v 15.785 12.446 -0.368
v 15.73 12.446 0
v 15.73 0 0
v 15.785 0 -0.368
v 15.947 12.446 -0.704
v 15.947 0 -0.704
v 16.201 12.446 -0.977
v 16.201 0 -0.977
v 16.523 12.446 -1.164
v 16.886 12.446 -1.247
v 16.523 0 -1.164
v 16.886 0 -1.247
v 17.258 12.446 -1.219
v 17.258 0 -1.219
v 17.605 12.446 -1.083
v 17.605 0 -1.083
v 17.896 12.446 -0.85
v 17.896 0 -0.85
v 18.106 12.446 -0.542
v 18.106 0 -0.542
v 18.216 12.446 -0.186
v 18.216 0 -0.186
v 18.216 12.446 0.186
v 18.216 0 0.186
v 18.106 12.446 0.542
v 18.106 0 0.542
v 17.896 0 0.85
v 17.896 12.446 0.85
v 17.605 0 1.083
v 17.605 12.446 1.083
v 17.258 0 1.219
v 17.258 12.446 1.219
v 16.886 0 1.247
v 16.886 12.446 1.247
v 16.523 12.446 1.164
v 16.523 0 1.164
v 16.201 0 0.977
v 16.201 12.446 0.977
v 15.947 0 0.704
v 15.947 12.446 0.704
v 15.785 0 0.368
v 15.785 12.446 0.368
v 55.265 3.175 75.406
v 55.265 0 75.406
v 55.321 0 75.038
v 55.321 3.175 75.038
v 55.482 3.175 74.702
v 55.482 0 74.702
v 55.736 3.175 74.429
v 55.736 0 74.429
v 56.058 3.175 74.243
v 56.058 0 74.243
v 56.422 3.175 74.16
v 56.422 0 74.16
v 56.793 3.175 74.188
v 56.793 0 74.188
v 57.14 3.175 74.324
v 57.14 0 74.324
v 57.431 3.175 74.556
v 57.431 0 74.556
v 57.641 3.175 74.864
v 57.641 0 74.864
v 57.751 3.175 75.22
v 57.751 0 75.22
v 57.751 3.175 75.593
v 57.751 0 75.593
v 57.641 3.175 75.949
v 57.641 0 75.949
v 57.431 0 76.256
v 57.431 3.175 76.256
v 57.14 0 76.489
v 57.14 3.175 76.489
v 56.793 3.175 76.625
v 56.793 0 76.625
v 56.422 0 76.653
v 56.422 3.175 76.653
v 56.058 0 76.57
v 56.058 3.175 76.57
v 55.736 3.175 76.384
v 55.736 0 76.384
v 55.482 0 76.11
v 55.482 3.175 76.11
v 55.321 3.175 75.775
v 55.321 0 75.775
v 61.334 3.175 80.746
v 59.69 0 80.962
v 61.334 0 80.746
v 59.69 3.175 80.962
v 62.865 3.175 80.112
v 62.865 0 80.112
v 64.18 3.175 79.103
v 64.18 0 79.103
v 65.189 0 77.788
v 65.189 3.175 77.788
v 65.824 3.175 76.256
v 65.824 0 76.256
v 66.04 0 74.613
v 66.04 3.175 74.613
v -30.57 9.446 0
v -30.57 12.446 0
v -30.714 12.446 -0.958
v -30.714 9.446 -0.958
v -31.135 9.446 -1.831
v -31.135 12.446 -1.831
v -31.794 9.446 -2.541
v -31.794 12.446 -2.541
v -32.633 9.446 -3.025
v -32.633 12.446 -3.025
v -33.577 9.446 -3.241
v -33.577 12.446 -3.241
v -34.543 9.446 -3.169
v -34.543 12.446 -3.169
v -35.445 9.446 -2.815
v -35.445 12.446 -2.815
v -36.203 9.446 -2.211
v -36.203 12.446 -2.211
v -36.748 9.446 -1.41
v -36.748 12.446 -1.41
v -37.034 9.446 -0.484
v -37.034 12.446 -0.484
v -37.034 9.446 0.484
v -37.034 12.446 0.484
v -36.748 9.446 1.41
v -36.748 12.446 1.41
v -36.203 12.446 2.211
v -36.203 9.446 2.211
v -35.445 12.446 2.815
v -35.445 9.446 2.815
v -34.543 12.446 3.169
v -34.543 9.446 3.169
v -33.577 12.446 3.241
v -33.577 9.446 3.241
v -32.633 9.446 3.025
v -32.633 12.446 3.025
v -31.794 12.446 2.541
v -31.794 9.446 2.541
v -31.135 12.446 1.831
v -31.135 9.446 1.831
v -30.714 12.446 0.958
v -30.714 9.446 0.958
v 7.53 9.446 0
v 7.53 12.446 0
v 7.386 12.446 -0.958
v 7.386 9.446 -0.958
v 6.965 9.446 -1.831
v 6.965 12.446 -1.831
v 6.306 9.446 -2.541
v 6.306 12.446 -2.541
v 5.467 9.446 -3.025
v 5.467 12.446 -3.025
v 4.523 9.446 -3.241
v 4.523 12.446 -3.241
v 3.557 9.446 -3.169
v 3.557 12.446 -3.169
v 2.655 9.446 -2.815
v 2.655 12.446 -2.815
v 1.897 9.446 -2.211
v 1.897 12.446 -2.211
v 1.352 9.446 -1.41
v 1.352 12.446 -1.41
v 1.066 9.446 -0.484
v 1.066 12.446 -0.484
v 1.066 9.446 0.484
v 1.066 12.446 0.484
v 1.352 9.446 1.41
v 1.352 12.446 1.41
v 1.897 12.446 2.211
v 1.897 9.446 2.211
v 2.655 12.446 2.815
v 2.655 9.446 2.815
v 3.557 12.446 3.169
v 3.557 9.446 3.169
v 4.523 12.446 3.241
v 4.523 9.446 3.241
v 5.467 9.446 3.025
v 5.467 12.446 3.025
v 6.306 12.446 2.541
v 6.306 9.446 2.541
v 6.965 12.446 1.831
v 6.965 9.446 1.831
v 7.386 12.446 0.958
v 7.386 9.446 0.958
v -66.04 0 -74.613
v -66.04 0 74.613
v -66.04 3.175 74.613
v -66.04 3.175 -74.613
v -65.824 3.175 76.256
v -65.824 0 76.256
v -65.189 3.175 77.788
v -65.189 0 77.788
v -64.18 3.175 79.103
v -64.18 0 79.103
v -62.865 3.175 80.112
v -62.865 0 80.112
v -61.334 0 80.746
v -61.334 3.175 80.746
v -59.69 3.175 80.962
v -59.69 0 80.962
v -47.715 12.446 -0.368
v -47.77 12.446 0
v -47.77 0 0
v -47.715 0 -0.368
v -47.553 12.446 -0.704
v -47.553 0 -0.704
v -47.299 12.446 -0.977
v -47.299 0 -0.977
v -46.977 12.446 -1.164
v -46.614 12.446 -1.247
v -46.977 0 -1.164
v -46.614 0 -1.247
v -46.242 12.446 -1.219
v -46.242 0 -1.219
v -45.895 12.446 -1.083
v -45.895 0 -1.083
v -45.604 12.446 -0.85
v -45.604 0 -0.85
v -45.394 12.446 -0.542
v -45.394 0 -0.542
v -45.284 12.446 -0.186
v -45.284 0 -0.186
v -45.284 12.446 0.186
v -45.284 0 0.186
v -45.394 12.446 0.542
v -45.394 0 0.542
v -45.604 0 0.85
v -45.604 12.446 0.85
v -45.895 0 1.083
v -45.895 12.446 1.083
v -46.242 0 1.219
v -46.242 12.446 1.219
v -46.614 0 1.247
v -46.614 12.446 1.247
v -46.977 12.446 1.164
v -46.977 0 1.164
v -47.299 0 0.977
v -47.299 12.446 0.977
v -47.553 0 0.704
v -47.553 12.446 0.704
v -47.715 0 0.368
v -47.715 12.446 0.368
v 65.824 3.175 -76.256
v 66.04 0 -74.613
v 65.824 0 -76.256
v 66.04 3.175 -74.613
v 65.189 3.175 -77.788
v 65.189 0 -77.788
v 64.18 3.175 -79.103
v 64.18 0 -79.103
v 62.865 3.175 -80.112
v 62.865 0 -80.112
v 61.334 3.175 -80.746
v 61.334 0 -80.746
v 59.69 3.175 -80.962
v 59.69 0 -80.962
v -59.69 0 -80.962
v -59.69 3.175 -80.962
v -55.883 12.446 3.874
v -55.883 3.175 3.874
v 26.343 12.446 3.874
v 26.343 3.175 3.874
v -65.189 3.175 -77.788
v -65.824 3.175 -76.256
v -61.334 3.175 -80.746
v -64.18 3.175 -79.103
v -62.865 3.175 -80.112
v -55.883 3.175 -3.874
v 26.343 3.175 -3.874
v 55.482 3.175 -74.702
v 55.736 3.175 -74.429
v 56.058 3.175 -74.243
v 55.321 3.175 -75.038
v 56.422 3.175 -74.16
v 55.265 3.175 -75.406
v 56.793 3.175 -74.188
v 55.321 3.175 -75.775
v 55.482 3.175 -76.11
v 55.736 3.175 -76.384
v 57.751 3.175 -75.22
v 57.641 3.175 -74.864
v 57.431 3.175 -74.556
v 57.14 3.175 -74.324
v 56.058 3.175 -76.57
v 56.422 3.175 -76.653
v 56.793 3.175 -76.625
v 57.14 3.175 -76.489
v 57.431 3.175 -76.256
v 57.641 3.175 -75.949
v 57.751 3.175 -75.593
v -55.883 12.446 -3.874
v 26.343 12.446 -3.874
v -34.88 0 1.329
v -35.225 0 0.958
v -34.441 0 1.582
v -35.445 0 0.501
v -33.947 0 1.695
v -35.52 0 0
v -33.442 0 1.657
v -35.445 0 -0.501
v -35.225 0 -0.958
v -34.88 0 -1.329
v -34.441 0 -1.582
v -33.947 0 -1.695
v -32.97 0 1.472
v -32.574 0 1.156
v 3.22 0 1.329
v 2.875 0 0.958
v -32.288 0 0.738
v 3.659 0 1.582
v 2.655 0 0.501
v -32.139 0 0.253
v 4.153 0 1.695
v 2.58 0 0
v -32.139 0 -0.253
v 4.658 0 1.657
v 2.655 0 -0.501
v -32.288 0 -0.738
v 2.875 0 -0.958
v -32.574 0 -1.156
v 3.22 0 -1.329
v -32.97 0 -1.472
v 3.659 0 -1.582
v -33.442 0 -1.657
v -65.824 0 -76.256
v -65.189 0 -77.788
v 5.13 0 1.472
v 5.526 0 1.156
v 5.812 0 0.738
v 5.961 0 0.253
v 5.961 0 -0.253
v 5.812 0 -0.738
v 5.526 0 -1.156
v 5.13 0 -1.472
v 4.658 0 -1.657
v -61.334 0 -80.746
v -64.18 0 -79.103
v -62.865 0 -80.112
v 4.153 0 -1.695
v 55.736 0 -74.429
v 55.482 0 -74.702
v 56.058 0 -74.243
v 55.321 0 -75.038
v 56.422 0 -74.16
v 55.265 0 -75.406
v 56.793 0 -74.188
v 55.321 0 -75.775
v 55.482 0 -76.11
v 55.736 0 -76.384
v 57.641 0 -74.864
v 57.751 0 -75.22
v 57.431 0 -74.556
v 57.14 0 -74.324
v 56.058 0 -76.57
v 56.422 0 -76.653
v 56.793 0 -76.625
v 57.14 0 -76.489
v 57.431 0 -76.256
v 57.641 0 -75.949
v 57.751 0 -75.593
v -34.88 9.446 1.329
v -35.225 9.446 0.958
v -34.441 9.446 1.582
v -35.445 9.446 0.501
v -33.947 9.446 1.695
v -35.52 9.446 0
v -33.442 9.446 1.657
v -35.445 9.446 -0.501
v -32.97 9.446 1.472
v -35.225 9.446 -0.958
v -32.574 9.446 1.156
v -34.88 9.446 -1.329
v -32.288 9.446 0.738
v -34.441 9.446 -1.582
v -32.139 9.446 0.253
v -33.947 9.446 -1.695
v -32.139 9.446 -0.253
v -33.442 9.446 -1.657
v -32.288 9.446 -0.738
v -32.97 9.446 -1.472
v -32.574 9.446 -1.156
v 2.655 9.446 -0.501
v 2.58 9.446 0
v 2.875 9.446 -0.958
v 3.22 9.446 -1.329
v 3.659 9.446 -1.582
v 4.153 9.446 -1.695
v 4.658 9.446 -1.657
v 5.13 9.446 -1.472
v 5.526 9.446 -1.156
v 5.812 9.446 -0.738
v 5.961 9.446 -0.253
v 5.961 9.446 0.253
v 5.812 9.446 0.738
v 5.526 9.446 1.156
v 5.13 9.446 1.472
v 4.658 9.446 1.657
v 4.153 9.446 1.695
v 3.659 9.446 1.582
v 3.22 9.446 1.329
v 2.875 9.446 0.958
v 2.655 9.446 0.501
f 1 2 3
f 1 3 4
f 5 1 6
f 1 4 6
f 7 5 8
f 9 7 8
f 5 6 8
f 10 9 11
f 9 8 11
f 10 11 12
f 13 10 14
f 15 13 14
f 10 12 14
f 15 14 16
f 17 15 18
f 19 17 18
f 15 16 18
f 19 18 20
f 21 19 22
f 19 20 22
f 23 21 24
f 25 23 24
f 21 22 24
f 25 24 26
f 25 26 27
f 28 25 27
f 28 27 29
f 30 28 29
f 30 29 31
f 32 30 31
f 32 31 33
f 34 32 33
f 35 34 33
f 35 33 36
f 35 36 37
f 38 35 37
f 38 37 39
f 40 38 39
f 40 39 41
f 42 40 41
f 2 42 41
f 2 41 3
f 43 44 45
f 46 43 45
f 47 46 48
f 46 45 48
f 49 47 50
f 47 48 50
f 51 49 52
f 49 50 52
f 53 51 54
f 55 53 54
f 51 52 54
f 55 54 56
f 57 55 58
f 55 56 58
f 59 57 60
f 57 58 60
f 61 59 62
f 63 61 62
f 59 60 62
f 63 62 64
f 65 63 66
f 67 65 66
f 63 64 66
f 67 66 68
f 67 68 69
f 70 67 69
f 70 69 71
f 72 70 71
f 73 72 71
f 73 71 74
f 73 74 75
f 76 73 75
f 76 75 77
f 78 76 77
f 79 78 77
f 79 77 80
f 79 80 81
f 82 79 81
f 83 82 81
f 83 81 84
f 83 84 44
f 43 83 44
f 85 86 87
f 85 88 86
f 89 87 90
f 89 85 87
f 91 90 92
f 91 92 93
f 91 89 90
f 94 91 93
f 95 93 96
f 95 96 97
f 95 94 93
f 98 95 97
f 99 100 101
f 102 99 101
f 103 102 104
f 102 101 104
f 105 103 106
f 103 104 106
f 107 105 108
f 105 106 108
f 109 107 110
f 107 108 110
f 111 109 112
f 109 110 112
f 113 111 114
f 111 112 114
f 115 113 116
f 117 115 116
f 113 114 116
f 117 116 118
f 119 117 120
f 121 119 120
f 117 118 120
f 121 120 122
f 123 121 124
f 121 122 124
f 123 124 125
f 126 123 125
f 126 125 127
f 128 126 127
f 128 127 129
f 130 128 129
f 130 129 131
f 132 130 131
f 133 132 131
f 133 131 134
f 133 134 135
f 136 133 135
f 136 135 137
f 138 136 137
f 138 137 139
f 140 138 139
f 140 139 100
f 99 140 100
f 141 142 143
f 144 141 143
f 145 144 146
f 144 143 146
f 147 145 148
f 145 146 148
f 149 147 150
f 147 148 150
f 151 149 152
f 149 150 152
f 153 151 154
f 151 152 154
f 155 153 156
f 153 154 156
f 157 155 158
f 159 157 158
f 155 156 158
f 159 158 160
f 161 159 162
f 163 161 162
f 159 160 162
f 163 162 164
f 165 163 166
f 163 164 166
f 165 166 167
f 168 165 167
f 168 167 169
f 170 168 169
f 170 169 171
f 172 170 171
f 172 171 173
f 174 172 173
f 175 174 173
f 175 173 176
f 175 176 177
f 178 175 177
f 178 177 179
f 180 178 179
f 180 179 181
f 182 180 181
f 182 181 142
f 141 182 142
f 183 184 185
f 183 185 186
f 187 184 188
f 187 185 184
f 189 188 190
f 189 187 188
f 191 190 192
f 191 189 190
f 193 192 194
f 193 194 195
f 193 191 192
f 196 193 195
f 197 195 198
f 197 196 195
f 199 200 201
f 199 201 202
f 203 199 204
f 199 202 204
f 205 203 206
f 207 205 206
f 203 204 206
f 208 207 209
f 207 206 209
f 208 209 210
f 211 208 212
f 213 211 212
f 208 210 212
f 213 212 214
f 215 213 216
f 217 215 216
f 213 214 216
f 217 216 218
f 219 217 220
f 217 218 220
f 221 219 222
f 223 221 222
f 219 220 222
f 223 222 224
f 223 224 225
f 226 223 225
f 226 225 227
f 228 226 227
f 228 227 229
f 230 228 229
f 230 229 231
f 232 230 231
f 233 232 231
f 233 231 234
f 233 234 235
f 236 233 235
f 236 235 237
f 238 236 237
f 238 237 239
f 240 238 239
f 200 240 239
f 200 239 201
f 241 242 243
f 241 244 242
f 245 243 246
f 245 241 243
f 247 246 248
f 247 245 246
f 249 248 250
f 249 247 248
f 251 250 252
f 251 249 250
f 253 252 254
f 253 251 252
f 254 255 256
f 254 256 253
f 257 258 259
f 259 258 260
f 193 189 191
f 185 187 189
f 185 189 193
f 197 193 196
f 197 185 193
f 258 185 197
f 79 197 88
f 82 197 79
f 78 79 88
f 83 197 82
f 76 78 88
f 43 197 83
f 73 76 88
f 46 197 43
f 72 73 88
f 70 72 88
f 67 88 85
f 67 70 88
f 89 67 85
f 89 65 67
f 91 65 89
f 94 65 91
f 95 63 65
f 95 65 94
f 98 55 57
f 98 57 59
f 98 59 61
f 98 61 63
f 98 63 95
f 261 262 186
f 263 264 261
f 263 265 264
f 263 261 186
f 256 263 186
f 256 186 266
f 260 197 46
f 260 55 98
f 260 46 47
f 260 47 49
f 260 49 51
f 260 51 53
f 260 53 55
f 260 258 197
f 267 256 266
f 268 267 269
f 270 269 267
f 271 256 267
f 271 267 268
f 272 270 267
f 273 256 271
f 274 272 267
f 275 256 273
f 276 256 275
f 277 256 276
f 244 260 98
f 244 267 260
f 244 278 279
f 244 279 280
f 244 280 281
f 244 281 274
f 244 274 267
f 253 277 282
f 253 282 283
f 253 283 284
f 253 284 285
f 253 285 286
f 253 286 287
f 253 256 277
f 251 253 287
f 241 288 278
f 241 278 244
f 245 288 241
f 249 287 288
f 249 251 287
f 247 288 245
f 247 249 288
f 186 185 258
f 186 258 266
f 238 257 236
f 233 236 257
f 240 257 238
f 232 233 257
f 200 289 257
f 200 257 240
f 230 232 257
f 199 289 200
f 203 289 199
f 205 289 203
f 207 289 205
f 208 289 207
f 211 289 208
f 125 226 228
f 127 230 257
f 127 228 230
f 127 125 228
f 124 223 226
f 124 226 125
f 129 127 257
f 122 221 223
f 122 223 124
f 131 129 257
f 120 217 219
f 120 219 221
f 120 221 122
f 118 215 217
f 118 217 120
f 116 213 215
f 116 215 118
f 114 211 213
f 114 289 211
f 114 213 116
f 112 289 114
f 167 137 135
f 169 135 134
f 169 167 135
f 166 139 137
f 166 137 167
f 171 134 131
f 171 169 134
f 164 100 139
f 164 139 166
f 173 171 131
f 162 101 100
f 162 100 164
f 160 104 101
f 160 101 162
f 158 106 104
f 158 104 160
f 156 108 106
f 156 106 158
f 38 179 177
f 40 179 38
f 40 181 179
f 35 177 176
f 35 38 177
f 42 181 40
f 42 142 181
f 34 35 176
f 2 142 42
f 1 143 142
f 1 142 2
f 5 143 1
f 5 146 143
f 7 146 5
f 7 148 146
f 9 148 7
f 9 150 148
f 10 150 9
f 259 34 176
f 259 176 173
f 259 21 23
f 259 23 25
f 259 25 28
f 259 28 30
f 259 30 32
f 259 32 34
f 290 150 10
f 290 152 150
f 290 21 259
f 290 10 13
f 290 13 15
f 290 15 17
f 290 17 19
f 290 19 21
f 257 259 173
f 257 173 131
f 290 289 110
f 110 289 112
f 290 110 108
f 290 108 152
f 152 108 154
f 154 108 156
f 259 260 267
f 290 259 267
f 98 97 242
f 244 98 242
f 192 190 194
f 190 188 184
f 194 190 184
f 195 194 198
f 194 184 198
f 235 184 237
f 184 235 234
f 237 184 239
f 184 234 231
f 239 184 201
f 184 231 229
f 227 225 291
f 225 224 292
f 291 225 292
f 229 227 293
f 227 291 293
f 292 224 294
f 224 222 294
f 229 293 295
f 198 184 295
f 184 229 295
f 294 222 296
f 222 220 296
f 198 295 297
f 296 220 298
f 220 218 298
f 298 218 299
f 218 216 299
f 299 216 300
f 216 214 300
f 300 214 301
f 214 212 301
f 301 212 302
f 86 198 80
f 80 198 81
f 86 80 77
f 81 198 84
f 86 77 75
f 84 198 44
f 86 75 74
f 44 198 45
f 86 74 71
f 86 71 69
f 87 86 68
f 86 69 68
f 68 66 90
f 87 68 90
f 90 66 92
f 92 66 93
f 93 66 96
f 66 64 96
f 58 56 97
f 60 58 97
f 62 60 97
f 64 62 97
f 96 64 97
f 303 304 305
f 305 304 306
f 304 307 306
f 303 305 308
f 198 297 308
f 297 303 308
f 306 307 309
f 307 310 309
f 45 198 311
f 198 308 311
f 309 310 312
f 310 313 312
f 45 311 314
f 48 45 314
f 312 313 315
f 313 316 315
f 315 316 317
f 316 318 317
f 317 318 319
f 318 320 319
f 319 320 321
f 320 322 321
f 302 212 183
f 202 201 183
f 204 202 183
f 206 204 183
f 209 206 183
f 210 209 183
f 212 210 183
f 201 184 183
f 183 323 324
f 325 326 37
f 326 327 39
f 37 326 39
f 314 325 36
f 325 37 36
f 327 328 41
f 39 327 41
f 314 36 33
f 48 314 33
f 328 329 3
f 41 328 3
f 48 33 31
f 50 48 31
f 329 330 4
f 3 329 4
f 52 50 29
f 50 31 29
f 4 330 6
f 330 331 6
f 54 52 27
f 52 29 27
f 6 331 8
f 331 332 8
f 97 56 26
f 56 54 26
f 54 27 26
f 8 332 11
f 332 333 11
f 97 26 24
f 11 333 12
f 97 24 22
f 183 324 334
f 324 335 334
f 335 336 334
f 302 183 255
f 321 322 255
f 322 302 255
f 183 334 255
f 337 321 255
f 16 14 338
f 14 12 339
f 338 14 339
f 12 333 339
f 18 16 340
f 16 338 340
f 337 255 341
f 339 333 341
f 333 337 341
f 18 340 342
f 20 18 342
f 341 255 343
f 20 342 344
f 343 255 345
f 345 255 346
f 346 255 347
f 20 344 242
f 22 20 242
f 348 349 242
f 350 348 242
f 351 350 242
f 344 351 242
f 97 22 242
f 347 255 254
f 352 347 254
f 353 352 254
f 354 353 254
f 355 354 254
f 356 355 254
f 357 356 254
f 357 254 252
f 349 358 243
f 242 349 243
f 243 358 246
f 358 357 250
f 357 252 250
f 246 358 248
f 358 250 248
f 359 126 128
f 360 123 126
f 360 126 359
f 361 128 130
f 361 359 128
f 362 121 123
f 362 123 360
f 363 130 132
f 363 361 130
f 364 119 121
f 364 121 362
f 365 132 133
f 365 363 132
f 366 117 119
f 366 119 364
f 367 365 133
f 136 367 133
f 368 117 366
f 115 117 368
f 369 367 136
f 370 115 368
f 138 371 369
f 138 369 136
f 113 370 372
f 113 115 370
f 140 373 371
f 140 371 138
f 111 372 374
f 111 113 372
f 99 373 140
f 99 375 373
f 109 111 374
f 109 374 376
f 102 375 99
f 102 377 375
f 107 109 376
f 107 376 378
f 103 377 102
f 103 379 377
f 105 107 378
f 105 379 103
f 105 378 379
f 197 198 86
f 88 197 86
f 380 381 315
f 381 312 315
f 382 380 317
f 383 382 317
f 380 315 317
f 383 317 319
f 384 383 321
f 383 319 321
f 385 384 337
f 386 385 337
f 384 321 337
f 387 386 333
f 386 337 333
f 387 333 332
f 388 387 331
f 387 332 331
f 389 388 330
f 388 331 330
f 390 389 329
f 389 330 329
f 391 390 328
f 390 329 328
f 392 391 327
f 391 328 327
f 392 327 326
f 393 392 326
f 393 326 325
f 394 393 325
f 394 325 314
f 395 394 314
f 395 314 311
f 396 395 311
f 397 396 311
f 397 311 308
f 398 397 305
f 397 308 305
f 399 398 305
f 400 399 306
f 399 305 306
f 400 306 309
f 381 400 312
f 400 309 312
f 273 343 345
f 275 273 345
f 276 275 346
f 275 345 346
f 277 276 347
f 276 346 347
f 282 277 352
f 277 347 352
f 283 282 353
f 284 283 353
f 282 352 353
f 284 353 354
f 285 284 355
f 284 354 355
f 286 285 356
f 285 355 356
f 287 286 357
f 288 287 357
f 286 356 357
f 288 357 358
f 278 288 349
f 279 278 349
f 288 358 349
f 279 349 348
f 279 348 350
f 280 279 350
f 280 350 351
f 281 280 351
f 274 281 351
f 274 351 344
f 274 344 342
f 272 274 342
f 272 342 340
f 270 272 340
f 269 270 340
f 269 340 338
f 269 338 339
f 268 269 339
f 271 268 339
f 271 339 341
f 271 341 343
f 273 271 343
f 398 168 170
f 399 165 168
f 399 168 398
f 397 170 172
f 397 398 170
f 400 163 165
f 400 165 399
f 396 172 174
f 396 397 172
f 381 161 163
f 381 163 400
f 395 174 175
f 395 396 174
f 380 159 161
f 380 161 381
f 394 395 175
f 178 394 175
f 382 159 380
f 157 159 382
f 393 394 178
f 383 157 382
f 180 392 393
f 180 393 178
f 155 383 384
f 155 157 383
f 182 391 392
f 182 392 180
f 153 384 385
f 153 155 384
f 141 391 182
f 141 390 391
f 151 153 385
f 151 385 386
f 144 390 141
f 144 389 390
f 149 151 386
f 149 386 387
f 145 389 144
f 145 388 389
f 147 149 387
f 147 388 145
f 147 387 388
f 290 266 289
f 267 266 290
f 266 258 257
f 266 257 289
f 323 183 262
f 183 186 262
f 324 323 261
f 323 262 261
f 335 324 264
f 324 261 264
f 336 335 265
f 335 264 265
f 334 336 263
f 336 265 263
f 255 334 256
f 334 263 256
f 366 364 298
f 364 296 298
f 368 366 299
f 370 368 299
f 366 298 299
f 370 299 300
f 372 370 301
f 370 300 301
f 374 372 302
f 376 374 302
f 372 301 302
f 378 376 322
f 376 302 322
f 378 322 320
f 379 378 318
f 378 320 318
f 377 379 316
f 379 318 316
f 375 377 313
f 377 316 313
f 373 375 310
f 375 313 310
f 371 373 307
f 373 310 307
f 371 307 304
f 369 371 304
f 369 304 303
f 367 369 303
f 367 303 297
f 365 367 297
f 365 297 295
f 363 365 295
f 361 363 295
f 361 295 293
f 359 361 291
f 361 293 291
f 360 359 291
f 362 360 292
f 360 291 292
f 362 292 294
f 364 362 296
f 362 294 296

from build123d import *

# Parameters (mm, degrees)
SKETCH1_W                      = 132.08
SKETCH1_H                      = 161.925
BOSS_EXTRUDE1_DEPTH            = 3.175
FILLET1_R                      = 6.35
TAP_DRILL_FOR_M3X0_5_TAP1_D    = 2.5
SKETCH5_W                      = 82.226471496
SKETCH5_H                      = 7.747
BOSS_EXTRUDE2_DEPTH            = 9.271
TAP_DRILL_FOR_M3X0_5_TAP2_D    = 2.5
CBORE_FOR_M3_SHCS1_D           = 3.4
CBORE_FOR_M3_SHCS1_CBORE_D     = 6.5
CBORE_FOR_M3_SHCS1_CBORE_DEPTH = 3


with BuildPart() as part:
    # Sketch1 → Boss-Extrude1 (new body)
    with BuildSketch(Plane(origin=(0, 0, 0), x_dir=(1, 0, 0), z_dir=(0, 1, 0))):
        Rectangle(SKETCH1_W, SKETCH1_H)
    extrude(amount=BOSS_EXTRUDE1_DEPTH)

    # Fillet1
    fillet1_edges = [part.edges().sort_by_distance(p)[0] for p in [
        (-66.04, 1.5875, -80.9625),
        (66.04, 1.5875, -80.9625),
        (66.04, 1.5875, 80.9625),
        (-66.04, 1.5875, 80.9625),
    ]]
    fillet(fillet1_edges, radius=FILLET1_R)

    # Tap Drill for M3x0.5 Tap1 (through all)
    with Locations(Plane(origin=(0, 3.175, 0), x_dir=(1, 0, 0), z_dir=(0, 1, 0))):
        with Locations((56.515, -75.40625), (56.515, 75.40625)):
            Hole(TAP_DRILL_FOR_M3X0_5_TAP1_D / 2)

    # Sketch5 → Boss-Extrude2 (add)
    with BuildSketch(Plane(origin=(0, 3.175, 0), x_dir=(1, 0, 0), z_dir=(0, 1, 0))):
        with Locations((-14.7701, 0)):
            Rectangle(SKETCH5_W, SKETCH5_H)
    extrude(amount=BOSS_EXTRUDE2_DEPTH)

    # Tap Drill for M3x0.5 Tap2 (through all)
    with Locations(Plane(origin=(0, 12.446, 0), x_dir=(1, 0, 0), z_dir=(0, 1, 0))):
        with Locations((-46.5201, 0), (16.9799, 0)):
            Hole(TAP_DRILL_FOR_M3X0_5_TAP2_D / 2)

    # CBORE for M3 SHCS1 (through all)
    with Locations(Plane(origin=(0, 12.446, 0), x_dir=(1, 0, 0), z_dir=(0, 1, 0))):
        with Locations((4.2799, 0), (-33.8201, 0)):
            CounterBoreHole(CBORE_FOR_M3_SHCS1_D / 2, CBORE_FOR_M3_SHCS1_CBORE_D / 2, CBORE_FOR_M3_SHCS1_CBORE_DEPTH)


solid = part.part
